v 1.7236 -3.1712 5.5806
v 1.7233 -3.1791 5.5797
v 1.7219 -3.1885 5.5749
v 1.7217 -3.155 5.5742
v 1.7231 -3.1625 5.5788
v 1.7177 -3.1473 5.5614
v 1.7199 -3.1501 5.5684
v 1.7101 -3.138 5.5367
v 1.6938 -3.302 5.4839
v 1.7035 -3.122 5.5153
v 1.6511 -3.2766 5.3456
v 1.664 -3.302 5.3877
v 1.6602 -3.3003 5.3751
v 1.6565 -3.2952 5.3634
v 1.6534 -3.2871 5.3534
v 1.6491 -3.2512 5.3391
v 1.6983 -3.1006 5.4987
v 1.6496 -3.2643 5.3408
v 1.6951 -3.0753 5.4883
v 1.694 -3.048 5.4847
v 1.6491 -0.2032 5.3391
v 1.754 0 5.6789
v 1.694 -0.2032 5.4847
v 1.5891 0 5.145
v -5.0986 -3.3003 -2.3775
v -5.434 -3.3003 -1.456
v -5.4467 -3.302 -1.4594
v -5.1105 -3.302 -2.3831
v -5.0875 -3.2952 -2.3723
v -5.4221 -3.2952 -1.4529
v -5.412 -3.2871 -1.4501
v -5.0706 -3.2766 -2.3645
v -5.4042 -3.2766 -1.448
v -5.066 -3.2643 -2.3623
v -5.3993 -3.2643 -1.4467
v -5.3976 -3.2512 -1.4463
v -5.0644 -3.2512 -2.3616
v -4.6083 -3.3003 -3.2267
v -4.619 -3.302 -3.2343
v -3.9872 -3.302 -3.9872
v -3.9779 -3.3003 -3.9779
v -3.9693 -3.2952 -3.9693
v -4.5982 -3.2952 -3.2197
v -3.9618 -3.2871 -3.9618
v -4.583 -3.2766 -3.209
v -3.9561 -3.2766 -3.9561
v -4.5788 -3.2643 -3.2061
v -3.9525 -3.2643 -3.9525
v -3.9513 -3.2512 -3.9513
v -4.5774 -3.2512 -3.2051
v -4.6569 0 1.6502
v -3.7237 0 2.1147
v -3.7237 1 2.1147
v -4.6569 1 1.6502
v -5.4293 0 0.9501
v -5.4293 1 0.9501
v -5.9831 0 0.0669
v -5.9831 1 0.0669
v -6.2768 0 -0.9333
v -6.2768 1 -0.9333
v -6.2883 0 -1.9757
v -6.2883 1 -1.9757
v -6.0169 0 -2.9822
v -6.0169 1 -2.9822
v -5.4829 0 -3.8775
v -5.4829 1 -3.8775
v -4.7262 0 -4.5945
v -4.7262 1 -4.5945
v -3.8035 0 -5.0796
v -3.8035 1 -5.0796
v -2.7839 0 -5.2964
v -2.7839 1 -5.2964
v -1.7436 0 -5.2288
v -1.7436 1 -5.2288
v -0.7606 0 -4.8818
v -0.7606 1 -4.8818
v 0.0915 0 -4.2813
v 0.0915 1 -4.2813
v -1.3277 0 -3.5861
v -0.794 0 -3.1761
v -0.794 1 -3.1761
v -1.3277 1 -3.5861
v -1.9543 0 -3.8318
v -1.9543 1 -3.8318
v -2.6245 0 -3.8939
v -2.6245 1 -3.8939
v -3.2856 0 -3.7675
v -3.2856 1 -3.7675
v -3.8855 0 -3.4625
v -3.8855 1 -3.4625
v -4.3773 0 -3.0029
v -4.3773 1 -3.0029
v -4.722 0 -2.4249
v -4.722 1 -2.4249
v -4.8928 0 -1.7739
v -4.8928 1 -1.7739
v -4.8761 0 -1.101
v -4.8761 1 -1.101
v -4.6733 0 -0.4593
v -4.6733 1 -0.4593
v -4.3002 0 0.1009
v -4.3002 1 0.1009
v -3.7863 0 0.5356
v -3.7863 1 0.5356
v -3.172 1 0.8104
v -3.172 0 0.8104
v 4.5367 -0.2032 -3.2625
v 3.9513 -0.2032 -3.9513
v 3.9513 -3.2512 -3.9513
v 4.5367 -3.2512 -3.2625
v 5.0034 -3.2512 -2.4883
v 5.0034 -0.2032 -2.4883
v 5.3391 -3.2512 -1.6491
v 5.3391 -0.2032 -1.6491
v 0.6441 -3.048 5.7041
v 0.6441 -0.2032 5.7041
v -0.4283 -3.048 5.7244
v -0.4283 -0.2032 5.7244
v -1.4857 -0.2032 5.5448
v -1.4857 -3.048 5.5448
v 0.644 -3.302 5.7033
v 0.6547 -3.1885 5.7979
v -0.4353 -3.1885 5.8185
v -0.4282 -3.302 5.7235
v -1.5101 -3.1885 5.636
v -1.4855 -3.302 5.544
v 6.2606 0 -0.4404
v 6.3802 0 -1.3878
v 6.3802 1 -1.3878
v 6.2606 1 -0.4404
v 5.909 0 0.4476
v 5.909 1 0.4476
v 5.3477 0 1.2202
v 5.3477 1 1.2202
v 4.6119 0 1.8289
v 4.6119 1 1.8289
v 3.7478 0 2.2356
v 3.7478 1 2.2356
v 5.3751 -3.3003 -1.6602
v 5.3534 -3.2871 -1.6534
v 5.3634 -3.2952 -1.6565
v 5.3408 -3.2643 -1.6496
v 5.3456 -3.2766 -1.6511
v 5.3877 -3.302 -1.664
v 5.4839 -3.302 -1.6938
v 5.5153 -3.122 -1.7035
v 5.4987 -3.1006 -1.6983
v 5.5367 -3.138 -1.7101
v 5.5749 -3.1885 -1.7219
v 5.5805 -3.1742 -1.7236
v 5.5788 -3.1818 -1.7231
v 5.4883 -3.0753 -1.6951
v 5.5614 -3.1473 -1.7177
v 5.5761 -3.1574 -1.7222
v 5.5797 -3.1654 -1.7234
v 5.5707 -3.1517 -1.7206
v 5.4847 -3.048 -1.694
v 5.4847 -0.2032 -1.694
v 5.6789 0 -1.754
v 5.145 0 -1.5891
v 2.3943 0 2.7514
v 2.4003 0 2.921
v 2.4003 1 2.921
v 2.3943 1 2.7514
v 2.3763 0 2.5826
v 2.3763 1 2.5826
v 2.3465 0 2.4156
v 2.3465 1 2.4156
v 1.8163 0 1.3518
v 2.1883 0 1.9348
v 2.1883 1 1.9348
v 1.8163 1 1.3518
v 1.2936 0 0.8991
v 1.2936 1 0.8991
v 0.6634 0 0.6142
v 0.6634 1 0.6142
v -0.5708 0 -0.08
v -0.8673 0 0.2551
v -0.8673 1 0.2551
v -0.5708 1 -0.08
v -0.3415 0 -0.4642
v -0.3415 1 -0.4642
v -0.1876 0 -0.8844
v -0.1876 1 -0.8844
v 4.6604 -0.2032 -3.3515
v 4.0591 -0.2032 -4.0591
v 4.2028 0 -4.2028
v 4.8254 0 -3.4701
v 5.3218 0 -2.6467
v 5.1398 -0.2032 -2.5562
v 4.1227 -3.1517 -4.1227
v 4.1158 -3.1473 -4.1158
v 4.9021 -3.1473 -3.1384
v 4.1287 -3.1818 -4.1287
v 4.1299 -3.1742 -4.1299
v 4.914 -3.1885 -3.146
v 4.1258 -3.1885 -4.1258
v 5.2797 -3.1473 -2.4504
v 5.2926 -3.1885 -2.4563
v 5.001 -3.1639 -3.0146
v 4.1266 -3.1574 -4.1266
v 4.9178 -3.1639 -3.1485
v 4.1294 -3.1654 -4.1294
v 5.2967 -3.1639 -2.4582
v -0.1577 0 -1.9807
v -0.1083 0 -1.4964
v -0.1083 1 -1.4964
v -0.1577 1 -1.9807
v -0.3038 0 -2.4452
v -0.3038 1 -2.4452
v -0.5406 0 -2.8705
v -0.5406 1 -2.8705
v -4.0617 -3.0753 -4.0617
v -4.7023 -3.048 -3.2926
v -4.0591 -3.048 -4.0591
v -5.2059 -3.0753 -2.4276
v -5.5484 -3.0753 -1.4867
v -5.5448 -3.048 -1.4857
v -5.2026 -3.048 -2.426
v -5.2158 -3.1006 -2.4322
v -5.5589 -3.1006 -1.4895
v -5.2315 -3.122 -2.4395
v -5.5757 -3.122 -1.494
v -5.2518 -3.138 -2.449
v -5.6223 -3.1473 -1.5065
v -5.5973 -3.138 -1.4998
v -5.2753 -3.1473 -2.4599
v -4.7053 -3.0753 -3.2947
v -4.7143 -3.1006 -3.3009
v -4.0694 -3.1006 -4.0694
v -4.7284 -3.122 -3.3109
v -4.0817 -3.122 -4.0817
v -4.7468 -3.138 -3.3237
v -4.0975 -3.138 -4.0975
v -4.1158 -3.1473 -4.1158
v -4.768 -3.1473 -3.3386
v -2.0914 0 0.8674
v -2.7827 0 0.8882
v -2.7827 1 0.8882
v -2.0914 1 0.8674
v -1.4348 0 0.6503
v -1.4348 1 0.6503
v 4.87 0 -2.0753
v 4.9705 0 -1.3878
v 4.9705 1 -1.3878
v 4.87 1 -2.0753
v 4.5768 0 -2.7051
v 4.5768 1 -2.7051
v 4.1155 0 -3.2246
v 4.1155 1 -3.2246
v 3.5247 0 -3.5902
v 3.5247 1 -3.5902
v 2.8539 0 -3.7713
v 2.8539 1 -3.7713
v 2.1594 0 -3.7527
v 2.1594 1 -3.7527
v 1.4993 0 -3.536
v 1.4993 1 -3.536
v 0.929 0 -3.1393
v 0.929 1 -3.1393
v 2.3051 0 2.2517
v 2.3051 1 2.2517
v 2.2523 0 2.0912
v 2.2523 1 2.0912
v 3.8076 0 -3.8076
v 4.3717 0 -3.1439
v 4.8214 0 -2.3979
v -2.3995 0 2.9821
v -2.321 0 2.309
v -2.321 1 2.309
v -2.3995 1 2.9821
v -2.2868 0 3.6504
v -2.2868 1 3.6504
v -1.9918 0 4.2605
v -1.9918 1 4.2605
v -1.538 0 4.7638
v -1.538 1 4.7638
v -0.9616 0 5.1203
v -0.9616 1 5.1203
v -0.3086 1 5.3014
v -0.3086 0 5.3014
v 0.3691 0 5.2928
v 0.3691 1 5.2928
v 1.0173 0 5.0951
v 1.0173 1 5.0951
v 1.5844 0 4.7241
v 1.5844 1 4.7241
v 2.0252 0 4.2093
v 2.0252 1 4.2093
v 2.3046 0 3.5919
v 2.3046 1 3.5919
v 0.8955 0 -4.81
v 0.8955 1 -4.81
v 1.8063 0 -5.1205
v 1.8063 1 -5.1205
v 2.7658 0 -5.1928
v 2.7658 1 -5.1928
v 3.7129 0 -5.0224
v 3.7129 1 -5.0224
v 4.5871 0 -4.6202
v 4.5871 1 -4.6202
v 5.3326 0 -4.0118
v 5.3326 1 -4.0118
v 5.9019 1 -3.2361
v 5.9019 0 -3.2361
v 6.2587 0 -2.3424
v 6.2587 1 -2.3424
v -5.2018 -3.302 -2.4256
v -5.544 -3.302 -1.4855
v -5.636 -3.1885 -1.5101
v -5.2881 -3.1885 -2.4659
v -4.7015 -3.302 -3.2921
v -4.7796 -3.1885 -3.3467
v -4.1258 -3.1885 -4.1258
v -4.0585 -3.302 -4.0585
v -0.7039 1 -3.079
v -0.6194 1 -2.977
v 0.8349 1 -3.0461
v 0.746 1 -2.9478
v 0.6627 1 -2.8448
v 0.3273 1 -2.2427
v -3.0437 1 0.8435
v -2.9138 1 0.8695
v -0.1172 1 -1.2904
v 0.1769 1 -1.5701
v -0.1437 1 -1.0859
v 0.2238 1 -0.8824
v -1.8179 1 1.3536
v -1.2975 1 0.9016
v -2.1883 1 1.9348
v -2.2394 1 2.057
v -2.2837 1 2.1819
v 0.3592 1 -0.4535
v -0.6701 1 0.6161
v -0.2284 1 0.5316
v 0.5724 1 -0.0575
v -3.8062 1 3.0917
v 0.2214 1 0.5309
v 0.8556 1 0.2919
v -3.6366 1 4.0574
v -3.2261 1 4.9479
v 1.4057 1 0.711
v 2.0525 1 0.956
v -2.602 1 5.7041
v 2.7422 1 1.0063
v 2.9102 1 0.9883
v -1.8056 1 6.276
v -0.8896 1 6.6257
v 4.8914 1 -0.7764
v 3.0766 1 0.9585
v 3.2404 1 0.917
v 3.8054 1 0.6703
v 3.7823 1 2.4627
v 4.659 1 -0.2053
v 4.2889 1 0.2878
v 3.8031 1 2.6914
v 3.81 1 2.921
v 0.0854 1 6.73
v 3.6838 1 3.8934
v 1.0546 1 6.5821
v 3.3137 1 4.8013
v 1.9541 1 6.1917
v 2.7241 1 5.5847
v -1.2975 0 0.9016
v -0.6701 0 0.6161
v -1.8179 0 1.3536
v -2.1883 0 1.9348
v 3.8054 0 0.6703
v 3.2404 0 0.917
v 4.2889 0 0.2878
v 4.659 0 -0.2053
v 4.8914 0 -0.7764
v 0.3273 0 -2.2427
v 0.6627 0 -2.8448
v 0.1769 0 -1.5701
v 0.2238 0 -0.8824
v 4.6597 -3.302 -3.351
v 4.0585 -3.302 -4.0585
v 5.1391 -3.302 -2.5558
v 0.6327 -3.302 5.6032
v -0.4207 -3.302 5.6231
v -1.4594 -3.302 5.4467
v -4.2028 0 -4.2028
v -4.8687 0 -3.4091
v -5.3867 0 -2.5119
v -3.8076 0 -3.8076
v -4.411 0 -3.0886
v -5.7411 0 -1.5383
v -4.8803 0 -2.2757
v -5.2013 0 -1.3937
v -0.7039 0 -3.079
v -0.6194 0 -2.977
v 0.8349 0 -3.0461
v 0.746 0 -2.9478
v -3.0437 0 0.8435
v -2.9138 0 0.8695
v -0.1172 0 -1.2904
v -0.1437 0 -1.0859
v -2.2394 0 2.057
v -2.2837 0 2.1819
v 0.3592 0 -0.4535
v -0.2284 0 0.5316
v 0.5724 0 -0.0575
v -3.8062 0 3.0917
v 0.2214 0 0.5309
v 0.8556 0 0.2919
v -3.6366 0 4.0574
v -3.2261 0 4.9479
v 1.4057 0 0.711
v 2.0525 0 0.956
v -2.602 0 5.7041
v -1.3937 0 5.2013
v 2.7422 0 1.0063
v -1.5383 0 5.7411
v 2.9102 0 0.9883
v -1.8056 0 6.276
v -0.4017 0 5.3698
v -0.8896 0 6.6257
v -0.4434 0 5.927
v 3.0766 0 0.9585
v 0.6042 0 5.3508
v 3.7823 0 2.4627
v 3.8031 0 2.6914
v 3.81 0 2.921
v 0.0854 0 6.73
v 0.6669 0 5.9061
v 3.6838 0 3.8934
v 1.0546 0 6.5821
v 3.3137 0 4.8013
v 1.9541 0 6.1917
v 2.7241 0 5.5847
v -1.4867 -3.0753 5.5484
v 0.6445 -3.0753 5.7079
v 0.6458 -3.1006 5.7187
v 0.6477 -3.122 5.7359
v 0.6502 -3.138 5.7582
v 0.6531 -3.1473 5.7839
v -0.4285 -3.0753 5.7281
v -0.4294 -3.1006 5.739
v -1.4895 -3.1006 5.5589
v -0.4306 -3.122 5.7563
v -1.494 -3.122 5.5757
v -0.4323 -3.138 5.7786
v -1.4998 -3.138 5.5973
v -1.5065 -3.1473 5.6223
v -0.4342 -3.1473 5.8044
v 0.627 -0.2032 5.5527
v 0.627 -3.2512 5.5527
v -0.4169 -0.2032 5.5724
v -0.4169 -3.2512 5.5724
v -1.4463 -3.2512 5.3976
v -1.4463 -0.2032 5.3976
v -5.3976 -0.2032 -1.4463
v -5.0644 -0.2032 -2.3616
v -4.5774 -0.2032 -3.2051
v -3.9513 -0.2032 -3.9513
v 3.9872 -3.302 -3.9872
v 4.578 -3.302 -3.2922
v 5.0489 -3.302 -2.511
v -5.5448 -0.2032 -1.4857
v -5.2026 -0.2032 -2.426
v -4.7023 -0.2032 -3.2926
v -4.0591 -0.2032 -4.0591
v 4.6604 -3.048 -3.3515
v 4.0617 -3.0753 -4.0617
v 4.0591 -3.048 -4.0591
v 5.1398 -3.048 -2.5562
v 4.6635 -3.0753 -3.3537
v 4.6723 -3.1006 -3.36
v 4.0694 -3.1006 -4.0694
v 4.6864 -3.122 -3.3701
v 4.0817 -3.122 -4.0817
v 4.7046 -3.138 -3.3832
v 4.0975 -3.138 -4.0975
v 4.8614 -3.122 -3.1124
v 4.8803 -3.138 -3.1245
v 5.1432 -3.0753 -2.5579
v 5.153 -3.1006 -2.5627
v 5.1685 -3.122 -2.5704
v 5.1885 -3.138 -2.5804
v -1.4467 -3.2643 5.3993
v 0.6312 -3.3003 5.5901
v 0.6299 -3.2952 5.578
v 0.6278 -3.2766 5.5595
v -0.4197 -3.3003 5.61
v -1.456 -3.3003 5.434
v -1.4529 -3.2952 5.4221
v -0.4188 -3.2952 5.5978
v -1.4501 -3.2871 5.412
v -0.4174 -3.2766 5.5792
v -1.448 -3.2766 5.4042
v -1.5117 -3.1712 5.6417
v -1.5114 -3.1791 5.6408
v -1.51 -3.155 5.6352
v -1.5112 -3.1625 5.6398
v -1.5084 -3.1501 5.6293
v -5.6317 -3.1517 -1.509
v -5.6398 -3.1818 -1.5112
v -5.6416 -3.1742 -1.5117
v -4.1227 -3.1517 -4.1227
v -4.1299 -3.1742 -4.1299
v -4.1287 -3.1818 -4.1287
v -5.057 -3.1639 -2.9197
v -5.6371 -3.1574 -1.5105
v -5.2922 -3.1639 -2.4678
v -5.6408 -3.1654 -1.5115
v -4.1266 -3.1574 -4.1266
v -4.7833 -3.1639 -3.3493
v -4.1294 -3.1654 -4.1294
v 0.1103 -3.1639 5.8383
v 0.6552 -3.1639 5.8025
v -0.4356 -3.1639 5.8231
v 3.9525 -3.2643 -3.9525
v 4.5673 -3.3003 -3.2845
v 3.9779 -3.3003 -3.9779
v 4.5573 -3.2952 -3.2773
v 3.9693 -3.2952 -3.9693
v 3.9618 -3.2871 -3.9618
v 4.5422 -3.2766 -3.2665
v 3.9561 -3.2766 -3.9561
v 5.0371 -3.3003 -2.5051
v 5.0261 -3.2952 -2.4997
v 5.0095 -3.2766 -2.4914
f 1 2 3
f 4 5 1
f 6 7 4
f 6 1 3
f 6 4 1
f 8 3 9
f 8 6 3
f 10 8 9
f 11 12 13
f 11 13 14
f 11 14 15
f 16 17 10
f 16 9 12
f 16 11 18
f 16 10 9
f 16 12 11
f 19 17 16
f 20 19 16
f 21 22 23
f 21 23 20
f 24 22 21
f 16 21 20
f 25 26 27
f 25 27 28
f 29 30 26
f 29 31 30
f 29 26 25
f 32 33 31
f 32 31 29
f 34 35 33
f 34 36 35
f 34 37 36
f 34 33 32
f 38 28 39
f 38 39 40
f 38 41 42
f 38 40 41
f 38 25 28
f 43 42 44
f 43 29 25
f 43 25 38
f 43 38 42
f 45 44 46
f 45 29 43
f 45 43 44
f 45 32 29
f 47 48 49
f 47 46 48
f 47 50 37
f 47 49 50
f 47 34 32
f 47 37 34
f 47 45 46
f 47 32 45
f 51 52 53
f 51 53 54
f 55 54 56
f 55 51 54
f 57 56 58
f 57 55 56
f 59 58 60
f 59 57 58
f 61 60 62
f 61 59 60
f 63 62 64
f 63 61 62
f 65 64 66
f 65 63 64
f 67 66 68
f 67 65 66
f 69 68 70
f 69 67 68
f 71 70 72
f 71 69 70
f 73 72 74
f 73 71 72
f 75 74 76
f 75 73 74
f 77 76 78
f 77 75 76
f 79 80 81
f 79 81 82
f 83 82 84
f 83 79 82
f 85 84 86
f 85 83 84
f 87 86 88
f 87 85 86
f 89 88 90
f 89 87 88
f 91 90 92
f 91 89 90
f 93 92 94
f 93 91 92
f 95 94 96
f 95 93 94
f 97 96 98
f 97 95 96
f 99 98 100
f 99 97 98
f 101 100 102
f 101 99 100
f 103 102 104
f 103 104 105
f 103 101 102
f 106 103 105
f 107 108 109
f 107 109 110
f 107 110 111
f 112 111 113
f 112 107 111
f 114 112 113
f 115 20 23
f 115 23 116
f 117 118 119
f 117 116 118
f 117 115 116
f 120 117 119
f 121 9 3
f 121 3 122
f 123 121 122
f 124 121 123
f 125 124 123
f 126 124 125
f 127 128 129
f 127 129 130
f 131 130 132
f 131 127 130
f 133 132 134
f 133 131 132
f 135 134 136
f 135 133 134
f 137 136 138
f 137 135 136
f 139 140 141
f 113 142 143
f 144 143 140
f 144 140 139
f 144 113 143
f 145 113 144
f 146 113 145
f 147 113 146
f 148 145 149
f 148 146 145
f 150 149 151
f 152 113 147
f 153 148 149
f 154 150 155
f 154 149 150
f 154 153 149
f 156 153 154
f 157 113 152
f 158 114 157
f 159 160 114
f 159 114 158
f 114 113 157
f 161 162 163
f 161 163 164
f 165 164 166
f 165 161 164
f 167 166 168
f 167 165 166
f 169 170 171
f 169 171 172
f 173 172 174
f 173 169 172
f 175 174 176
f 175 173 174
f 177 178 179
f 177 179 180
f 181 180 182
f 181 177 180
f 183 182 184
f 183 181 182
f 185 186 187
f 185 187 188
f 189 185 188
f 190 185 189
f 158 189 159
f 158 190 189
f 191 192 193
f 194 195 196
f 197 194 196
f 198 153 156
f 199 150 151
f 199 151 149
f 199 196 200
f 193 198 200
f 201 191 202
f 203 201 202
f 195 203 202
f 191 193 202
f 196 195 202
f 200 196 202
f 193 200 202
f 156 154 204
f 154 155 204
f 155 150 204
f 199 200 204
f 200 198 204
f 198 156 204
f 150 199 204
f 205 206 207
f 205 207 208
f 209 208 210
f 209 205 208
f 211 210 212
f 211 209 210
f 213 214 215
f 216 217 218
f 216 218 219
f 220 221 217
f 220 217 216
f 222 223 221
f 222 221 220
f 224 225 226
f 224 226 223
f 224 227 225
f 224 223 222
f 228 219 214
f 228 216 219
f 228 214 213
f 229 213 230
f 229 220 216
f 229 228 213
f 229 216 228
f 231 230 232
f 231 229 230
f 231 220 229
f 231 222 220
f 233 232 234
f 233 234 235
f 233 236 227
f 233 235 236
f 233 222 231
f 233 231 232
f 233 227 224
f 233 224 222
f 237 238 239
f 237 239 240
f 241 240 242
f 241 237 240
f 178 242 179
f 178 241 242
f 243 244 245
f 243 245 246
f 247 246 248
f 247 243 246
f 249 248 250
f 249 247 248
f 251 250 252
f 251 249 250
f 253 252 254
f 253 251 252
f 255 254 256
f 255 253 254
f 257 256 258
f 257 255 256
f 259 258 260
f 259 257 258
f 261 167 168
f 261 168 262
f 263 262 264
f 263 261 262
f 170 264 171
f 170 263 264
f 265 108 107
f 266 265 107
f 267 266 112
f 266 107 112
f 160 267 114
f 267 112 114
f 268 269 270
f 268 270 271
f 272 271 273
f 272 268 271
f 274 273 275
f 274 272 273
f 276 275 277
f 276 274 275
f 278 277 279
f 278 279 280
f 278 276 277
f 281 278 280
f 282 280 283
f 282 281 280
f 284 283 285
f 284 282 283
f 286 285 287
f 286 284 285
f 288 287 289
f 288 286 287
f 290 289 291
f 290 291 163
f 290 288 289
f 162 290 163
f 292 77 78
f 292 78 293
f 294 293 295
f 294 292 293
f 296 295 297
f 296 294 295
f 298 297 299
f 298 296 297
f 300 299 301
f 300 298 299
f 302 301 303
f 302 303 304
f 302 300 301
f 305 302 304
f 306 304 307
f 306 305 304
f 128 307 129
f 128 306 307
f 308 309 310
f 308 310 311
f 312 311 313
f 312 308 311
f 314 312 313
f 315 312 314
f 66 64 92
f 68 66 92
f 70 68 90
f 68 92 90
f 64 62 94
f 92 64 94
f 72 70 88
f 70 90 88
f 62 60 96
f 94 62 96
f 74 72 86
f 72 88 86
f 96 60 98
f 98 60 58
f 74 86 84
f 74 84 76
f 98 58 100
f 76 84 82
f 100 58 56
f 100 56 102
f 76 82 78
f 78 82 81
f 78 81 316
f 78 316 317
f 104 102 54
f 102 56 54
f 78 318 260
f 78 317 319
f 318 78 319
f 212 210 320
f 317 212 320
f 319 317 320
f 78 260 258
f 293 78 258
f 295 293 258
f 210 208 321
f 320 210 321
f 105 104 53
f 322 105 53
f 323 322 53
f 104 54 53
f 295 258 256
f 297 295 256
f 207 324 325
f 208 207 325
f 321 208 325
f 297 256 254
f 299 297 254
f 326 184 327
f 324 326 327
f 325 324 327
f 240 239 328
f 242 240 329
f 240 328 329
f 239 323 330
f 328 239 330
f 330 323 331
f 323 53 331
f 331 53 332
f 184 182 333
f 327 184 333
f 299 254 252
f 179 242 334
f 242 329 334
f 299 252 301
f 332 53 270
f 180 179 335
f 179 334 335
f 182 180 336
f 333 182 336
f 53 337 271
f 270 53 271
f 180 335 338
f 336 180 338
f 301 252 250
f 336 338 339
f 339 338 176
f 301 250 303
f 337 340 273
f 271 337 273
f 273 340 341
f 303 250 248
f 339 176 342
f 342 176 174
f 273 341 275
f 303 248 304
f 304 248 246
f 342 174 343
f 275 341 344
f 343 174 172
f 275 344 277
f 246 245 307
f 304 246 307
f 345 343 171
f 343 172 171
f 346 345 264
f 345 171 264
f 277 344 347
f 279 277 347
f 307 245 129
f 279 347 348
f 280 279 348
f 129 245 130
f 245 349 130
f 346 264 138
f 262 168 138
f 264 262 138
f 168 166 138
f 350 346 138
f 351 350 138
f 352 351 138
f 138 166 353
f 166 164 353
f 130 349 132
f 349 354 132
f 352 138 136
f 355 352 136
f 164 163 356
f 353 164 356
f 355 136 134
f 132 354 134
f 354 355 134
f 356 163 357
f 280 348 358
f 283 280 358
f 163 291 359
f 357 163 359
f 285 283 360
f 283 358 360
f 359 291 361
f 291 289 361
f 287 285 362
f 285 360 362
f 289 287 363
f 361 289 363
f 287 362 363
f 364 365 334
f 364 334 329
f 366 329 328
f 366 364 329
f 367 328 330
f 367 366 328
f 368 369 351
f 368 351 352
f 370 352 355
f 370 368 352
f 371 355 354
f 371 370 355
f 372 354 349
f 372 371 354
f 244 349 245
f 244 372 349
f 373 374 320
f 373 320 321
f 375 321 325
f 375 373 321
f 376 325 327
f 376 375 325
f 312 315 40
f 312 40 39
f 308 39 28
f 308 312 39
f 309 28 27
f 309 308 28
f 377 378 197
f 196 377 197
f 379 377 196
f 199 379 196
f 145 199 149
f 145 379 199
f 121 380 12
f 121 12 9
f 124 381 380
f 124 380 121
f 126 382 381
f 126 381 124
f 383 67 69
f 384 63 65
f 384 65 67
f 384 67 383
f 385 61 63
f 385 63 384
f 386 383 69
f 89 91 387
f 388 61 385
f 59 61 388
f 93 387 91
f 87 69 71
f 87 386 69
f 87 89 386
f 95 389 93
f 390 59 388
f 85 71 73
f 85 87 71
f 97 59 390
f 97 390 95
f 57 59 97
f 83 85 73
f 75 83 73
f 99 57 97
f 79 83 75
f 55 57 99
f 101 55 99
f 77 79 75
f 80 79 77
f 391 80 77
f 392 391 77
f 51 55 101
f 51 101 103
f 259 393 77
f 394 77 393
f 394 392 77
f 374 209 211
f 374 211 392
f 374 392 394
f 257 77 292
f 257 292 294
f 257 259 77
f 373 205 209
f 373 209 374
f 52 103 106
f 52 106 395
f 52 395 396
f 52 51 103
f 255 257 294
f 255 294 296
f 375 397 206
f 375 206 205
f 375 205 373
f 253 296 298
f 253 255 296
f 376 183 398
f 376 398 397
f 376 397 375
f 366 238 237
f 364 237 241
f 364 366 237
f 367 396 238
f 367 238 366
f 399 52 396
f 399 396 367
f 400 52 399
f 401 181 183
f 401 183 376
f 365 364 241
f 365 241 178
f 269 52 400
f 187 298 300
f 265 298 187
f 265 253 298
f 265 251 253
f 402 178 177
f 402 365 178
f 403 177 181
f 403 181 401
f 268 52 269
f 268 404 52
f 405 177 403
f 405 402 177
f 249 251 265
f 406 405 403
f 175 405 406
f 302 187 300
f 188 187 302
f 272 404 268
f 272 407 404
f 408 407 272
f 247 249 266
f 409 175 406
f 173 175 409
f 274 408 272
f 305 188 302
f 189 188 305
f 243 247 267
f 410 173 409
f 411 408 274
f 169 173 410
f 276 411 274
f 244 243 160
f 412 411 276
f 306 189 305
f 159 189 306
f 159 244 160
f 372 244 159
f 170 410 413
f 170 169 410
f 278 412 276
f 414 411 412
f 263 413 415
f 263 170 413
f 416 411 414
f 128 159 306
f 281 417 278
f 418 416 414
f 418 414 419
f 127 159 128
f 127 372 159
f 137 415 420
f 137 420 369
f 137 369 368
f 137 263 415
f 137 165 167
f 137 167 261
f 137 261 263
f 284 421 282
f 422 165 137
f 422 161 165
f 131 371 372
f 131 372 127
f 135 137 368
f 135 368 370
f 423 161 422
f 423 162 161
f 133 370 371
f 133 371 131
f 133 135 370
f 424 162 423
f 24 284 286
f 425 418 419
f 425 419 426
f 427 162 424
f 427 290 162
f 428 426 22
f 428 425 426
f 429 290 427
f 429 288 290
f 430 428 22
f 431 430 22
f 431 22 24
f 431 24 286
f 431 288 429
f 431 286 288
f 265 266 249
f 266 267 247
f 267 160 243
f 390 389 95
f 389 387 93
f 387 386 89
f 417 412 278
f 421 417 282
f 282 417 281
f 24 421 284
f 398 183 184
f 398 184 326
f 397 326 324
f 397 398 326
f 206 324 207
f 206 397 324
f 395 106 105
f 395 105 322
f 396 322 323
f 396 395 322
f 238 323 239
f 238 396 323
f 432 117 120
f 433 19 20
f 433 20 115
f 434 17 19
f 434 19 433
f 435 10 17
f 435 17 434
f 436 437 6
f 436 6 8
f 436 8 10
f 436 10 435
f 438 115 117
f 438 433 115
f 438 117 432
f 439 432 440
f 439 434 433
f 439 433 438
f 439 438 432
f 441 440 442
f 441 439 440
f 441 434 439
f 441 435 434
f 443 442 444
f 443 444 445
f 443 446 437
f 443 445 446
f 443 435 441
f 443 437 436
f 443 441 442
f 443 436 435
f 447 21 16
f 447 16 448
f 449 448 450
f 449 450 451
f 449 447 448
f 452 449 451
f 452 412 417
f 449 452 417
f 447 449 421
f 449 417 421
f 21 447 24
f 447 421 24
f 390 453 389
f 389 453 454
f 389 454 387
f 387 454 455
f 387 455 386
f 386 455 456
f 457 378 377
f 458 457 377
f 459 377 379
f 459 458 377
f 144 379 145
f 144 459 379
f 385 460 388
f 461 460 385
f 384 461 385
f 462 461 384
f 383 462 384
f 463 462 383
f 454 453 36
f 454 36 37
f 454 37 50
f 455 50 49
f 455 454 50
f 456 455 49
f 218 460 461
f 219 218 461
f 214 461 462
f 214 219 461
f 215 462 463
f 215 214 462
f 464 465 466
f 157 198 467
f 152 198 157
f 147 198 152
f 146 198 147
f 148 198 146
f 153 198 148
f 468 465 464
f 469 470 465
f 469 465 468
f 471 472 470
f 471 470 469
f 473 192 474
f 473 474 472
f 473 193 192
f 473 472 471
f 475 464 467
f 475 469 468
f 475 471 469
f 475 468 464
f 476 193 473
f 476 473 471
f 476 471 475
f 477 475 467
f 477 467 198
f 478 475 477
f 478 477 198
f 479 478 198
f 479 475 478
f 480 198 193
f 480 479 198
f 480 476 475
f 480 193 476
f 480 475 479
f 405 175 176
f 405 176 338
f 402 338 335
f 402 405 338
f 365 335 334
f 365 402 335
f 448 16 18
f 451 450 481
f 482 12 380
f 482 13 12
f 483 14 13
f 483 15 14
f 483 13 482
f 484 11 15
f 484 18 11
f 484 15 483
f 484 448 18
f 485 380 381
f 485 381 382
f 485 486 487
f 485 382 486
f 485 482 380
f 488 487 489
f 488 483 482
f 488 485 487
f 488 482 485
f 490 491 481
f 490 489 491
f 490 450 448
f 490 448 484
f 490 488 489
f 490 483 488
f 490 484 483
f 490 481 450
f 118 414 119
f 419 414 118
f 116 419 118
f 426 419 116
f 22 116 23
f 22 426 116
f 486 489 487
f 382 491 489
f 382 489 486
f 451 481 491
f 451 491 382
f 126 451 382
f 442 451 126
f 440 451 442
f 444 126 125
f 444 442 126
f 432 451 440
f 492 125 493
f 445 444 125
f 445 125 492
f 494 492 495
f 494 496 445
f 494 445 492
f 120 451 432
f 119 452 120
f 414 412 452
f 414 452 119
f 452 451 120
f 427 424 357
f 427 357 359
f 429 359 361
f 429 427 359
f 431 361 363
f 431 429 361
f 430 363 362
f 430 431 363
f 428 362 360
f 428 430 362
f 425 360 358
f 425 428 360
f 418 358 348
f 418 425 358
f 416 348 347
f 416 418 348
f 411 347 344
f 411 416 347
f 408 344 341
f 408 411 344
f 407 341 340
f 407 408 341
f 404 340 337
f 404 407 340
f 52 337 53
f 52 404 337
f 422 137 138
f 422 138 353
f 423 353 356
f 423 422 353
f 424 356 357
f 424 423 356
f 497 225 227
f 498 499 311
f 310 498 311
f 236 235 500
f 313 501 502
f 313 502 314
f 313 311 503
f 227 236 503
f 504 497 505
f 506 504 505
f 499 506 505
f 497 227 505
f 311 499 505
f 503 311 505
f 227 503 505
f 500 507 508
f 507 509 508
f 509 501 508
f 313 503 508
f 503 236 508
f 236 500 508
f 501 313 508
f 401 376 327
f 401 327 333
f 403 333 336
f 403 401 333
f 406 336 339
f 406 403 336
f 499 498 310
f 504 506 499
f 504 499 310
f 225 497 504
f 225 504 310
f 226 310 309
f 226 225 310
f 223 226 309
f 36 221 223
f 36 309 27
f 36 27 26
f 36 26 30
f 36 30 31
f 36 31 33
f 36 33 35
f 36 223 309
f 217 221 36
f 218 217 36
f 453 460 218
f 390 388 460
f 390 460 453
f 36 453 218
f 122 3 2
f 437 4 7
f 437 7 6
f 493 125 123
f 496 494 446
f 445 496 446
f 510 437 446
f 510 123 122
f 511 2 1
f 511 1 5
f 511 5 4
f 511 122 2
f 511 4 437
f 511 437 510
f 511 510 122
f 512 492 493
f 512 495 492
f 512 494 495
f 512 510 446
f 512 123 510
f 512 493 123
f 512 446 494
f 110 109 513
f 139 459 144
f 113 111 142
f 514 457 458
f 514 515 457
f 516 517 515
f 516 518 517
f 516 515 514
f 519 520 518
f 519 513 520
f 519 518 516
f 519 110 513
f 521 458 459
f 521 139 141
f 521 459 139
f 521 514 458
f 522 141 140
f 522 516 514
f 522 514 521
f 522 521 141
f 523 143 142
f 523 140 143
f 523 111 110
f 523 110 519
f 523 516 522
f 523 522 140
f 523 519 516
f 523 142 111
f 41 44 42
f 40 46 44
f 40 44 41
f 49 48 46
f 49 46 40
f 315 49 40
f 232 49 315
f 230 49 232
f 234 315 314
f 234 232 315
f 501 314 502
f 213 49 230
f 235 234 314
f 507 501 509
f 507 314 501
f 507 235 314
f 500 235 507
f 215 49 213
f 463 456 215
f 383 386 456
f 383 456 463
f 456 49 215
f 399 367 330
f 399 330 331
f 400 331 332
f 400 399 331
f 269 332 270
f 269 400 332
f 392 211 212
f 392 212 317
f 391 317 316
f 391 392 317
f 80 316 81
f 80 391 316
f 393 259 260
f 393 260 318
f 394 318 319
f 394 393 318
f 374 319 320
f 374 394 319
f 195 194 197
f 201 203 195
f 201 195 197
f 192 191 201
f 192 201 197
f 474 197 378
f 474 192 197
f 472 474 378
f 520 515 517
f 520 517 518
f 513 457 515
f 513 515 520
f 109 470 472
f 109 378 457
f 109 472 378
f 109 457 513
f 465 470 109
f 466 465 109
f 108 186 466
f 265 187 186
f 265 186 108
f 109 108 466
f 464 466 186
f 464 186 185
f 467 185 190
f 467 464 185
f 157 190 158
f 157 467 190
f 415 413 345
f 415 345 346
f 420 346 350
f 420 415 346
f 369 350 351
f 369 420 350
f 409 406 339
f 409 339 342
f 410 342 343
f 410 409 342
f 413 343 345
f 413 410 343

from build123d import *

# Parameters (mm, degrees)
F1_DEPTH = 1
F5_DEPTH = 25.4
F6_SIZE  = 0.2032
F7_R     = 0.0254


with BuildPart() as f1:
    # F0 (on Front) → F1 (new body)
    with BuildSketch(Plane.XZ):
        with BuildLine():
            ThreePointArc((-3.1719905538, 0.8104133692), (-2.9789481059, 0.8573735562), (-2.7826833559, 0.8882085007))
            ThreePointArc((-2.7826833559, 0.8882085007), (-2.54, 1.4424427198), (-2.1883394383, 1.9347897826))
            ThreePointArc((-2.1883394383, 1.9347897826), (-2.2624018983, 2.119141072), (-2.3209650279, 2.3089857605))
            ThreePointArc((-2.3209650279, 2.3089857605), (-3.0314381709, 2.2775636636), (-3.7236948272, 2.1146521631))
            ThreePointArc((-3.7236948272, 2.1146521631), (-3.5089712063, 1.4366748761), (-3.1719905538, 0.8104133692))
        make_face()
        with BuildLine():
            ThreePointArc((-2.7826833559, 0.8882085007), (-1.7552661043, 0.7826291226), (-0.8673282268, 0.2550880913))
            ThreePointArc((-0.8673282268, 0.2550880913), (-0.7736155948, 0.4382816345), (-0.6701492774, 0.616148587))
            ThreePointArc((-0.6701492774, 0.616148587), (-1.5739895442, 1.10881982), (-2.1883394383, 1.9347897826))
            ThreePointArc((-2.1883394383, 1.9347897826), (-2.54, 1.4424427198), (-2.7826833559, 0.8882085007))
        make_face()
        with BuildLine():
            ThreePointArc((0.0915085685, -4.2812712036), (-0.4030364452, -3.7702089133), (-0.7939885782, -3.1761416908))
            ThreePointArc((-0.7939885782, -3.1761416908), (-4.5700075585, -2.7260345936), (-3.1719905538, 0.8104133692))
            ThreePointArc((-3.1719905538, 0.8104133692), (-3.5089712063, 1.4366748761), (-3.7236948272, 2.1146521631))
            ThreePointArc((-3.7236948272, 2.1146521631), (-5.7806778186, -3.4482060491), (0.0915085685, -4.2812712036))
        make_face()
        with BuildLine():
            ThreePointArc((0.6627274406, -2.8448257134), (0.0624196597, -2.9203329923), (-0.5405661999, -2.8705451022))
            ThreePointArc((-0.5405661999, -2.8705451022), (-0.6609484293, -3.028591819), (-0.7939885782, -3.1761416908))
            ThreePointArc((-0.7939885782, -3.1761416908), (-0.4030364452, -3.7702089133), (0.0915085685, -4.2812712036))
            ThreePointArc((0.0915085685, -4.2812712036), (0.5637648419, -3.7495443495), (0.9289761445, -3.1393147701))
            ThreePointArc((0.9289761445, -3.1393147701), (0.7897528718, -2.9975842997), (0.6627274406, -2.8448257134))
        make_face()
        with BuildLine():
            ThreePointArc((0.9289761445, -3.1393147701), (0.5637648419, -3.7495443495), (0.0915085685, -4.2812712036))
            ThreePointArc((0.0915085685, -4.2812712036), (4.1627448452, -4.8490549435), (6.3802439522, -1.3878353744))
            ThreePointArc((6.3802439522, -1.3878353744), (5.6526747439, 0.8515217687), (3.7478447845, 2.235609986))
            ThreePointArc((3.7478447845, 2.235609986), (3.5557756025, 1.5525849076), (3.2403932296, 0.9170160386))
            ThreePointArc((3.2403932296, 0.9170160386), (4.4898792562, 0.0531505345), (4.9705439522, -1.3878353744))
            ThreePointArc((4.9705439522, -1.3878353744), (3.5246822611, -3.590217631), (0.9289761445, -3.1393147701))
        make_face()
        with BuildLine():
            ThreePointArc((-0.1876310066, -0.8843770648), (-0.1282124051, -1.1878238615), (-0.1082960345, -1.4963913043))
            ThreePointArc((-0.1082960345, -1.4963913043), (-0.2189124208, -2.2166614196), (-0.5405661999, -2.8705451022))
            ThreePointArc((-0.5405661999, -2.8705451022), (0.0624196597, -2.9203329923), (0.6627274406, -2.8448257134))
            ThreePointArc((0.6627274406, -2.8448257134), (0.2278326149, -1.9118098174), (0.2237573797, -0.8824238043))
            ThreePointArc((0.2237573797, -0.8824238043), (0.0180895692, -0.8889570559), (-0.1876310066, -0.8843770648))
        make_face()
        with BuildLine():
            ThreePointArc((-0.8673282268, 0.2550880913), (-0.4471845105, -0.2667480151), (-0.1876310066, -0.8843770648))
            ThreePointArc((-0.1876310066, -0.8843770648), (0.0180895692, -0.8889570559), (0.2237573797, -0.8824238043))
            ThreePointArc((0.2237573797, -0.8824238043), (0.4565057727, -0.2504915396), (0.8556364959, 0.2919150121))
            ThreePointArc((0.8556364959, 0.2919150121), (0.7634857496, 0.4554234405), (0.6633945194, 0.6141953265))
            ThreePointArc((0.6633945194, 0.6141953265), (-0.0035157497, 0.5207025748), (-0.6701492774, 0.616148587))
            ThreePointArc((-0.6701492774, 0.616148587), (-0.7736155948, 0.4382816345), (-0.8673282268, 0.2550880913))
        make_face()
        with BuildLine():
            ThreePointArc((2.1883394383, 1.9347897826), (2.5085960345, 1.4963913043), (2.7421898737, 1.0062980158))
            ThreePointArc((2.7421898737, 1.0062980158), (2.9936514378, 0.9748254542), (3.2403932296, 0.9170160386))
            ThreePointArc((3.2403932296, 0.9170160386), (3.5557756025, 1.5525849076), (3.7478447845, 2.235609986))
            ThreePointArc((3.7478447845, 2.235609986), (3.0555813535, 2.3911258065), (2.3464865725, 2.4155884299))
            ThreePointArc((2.3464865725, 2.4155884299), (2.2801213941, 2.1710089879), (2.1883394383, 1.9347897826))
        make_face()
        with BuildLine():
            ThreePointArc((0.6633945194, 0.6141953265), (0.7634857496, 0.4554234405), (0.8556364959, 0.2919150121))
            ThreePointArc((0.8556364959, 0.2919150121), (1.7202222338, 0.8569147606), (2.7421898737, 1.0062980158))
            ThreePointArc((2.7421898737, 1.0062980158), (2.5085960345, 1.4963913043), (2.1883394383, 1.9347897826))
            ThreePointArc((2.1883394383, 1.9347897826), (1.5713335326, 1.1065163216), (0.6633945194, 0.6141953265))
        make_face()
        with BuildLine():
            ThreePointArc((3.81, 2.921), (-0.4054767, 6.7093622643), (-3.7236948272, 2.1146521631))
            ThreePointArc((-3.7236948272, 2.1146521631), (-3.0314381709, 2.2775636636), (-2.3209650279, 2.3089857605))
            ThreePointArc((-2.3209650279, 2.3089857605), (-0.3085674429, 5.3013836294), (2.4003, 2.921))
            ThreePointArc((2.4003, 2.921), (2.3868087282, 2.6668658129), (2.3464865725, 2.4155884299))
            ThreePointArc((2.3464865725, 2.4155884299), (3.0555813535, 2.3911258065), (3.7478447845, 2.235609986))
            ThreePointArc((3.7478447845, 2.235609986), (3.7944293793, 2.5768987278), (3.81, 2.921))
        make_face()
    extrude(amount=-F1_DEPTH)

    # F2 (on Right) → F3 (revolve)
    with BuildSketch(Plane.YZ):
        with BuildLine():
            Line((-3.2512, 5.588), (0, 5.588))
            Line((0, 5.588), (0, 5.7404))
            Line((0, 5.7404), (-3.048, 5.7404))
            ThreePointArc((-3.048, 5.7404), (-3.119842049, 5.770157951), (-3.1496, 5.842))
            Line((-3.1496, 5.842), (-3.1496, 5.8674))
            Line((-3.1496, 5.8674), (-3.302, 5.7395212162))
            Line((-3.302, 5.7395212162), (-3.302, 5.6388))
            ThreePointArc((-3.302, 5.6388), (-3.2871210245, 5.6028789755), (-3.2512, 5.588))
        make_face()
    revolve(axis=Axis((0, -1.6292430228, 0), (0, -1, 0)))

    # F4 (on face) → F5 (cut)
    with BuildSketch(Plane.XZ):
        Polygon((-3.2870018728, 12.2672579939), (-12.2672579939, -3.2870018728), (0, 0), align=None)
        Polygon((3.7478447845, 12.1343998398), (0, 0), (12.1343998398, -3.7478447845), align=None)
        Polygon((8.9802561211, -8.9802561211), (0, 0), (-8.9802561211, -8.9802561211), align=None)
    extrude(amount=F5_DEPTH, mode=Mode.SUBTRACT)

    # F6
    f6_edges = [f1.edges().sort_by_distance(p)[0] for p in [
        (4.91625, 0, -2.963559),
        (4.78573, 0, -2.88488),
        (-4.971332, 0, -2.8702),
        (-4.83935, 0, -2.794),
        (0.108392, 0, 5.739377),
        (0.105515, 0, 5.587004),
    ]]
    chamfer(f6_edges, length=F6_SIZE)

    # F7
    f7_edges = [f1.edges().sort_by_distance(p)[0] for p in [
        (0.11079, -3.1496, 5.866354),
        (-5.081317, -3.1496, -2.9337),
        (5.025016, -3.1496, -3.029124),
    ]]
    fillet(f7_edges, radius=F7_R)


solid = f1.part
